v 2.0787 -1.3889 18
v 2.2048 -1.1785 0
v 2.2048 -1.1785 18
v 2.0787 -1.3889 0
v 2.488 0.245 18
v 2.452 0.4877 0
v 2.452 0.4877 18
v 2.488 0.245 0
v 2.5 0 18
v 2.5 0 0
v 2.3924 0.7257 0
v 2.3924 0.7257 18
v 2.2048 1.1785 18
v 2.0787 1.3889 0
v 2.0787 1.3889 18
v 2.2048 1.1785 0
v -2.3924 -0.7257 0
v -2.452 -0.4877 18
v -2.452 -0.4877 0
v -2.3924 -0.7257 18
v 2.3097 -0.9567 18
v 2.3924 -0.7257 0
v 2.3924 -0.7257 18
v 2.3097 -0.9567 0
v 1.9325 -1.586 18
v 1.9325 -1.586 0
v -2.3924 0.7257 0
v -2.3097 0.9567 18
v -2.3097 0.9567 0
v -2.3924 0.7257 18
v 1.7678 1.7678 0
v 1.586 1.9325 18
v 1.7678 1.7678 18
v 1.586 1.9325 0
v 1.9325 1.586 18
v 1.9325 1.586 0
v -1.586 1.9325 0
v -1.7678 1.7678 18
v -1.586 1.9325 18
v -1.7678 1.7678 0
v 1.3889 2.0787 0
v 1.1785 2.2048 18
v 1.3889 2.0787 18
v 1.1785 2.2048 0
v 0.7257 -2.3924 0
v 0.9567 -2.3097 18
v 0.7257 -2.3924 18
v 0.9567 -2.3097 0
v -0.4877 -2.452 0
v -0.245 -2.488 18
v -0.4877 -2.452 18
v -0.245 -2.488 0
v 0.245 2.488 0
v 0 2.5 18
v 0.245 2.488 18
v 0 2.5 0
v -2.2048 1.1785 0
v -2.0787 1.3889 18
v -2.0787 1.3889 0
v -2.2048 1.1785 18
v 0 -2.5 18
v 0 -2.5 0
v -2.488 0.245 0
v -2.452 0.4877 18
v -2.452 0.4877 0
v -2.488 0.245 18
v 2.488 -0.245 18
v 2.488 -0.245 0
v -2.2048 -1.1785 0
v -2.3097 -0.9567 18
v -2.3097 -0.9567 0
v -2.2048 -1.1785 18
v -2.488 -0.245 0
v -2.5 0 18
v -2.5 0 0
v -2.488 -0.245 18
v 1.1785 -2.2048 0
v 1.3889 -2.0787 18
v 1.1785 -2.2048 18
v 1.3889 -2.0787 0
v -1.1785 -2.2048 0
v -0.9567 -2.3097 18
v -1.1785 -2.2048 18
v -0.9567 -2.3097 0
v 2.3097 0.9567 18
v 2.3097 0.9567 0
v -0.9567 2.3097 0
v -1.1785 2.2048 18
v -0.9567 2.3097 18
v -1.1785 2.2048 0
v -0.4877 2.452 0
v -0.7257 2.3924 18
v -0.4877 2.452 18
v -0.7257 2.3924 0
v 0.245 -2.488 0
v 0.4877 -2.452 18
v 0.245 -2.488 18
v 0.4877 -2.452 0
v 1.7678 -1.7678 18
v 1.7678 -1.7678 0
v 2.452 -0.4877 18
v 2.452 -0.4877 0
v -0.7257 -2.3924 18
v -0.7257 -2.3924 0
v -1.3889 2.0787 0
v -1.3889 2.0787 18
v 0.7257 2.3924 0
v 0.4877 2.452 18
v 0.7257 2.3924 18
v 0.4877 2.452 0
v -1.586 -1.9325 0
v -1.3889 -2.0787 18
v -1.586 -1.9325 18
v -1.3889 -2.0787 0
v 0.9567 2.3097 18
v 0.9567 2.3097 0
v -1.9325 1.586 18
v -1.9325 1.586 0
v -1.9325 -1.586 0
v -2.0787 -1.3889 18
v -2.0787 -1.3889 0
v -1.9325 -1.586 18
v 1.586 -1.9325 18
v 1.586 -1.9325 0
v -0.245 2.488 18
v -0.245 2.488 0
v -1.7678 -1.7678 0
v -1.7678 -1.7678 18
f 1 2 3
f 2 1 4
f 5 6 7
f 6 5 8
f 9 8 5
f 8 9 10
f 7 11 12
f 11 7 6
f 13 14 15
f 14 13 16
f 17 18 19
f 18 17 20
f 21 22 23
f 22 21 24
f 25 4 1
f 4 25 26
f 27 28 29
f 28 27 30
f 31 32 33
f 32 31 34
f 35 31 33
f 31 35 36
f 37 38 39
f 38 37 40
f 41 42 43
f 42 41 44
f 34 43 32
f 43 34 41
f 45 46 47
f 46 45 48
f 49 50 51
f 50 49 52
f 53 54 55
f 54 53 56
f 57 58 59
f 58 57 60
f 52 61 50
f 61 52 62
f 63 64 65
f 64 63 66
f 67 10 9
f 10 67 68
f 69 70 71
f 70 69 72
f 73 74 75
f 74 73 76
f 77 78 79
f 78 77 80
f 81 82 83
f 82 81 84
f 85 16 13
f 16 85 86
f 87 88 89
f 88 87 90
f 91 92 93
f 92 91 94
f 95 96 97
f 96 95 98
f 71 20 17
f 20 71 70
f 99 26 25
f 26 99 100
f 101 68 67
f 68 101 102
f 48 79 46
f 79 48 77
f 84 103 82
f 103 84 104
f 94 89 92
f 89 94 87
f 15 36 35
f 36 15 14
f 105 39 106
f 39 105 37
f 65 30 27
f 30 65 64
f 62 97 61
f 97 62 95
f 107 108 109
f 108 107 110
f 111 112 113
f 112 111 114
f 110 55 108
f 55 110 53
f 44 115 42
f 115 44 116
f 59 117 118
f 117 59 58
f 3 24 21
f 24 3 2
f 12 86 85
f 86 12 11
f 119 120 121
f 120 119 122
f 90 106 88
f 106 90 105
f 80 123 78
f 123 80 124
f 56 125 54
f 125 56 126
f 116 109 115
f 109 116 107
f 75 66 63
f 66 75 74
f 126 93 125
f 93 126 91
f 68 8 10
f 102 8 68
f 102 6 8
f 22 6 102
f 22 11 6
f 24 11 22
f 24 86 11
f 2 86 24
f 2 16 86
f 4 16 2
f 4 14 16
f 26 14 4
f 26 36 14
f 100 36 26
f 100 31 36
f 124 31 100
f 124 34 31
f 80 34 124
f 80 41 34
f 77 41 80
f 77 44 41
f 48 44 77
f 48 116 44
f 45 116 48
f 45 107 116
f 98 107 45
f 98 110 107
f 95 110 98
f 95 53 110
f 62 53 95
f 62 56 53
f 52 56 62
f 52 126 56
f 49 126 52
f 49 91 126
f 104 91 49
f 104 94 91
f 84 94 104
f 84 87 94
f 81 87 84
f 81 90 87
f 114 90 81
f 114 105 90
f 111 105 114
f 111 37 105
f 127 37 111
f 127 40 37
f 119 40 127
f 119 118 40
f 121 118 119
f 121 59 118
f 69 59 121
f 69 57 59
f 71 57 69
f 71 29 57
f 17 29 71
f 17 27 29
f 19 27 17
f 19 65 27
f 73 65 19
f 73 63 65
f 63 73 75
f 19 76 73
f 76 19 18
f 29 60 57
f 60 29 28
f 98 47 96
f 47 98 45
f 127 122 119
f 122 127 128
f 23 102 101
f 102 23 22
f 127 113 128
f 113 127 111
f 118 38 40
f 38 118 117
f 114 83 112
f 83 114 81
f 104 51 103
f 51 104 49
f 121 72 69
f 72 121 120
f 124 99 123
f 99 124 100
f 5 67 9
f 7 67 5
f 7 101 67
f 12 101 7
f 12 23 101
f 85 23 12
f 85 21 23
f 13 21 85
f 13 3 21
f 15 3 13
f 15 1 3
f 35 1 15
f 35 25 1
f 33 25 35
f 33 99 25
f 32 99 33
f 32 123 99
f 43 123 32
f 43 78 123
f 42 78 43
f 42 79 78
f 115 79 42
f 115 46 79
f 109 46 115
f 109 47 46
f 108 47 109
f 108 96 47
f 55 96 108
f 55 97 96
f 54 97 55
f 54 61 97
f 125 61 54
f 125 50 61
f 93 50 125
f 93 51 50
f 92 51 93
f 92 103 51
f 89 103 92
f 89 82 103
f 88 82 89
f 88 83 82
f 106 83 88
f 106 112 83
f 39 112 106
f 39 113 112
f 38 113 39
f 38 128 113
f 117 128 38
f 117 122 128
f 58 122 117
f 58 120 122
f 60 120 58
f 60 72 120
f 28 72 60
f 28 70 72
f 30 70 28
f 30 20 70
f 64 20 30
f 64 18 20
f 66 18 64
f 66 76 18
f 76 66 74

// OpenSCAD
$fn = 64;

shaft_diameter = 5;
shaft_length = 18;
shoulder_diameter = 10;
shoulder_thickness = 0;
flat_y = 3;
groove_width = 0;
groove_root_diameter = 10;

module support_pin() {
  difference() {
    union() {
      cylinder(h = shaft_length, d = shaft_diameter);
      if (shoulder_thickness > 0) {
        translate([0, 0, shaft_length])
          cylinder(h = shoulder_thickness, d = shoulder_diameter);
      }
    }

    translate([-shaft_diameter, flat_y, -1])
      cube([shaft_diameter * 2, shaft_diameter, shaft_length + 2]);

    if (groove_width > 0) {
      translate([0, 0, shaft_length + shoulder_thickness / 2])
        rotate_extrude()
          translate([groove_root_diameter / 2, -groove_width / 2])
            square([shoulder_diameter, groove_width]);
    }
  }
}

support_pin();
